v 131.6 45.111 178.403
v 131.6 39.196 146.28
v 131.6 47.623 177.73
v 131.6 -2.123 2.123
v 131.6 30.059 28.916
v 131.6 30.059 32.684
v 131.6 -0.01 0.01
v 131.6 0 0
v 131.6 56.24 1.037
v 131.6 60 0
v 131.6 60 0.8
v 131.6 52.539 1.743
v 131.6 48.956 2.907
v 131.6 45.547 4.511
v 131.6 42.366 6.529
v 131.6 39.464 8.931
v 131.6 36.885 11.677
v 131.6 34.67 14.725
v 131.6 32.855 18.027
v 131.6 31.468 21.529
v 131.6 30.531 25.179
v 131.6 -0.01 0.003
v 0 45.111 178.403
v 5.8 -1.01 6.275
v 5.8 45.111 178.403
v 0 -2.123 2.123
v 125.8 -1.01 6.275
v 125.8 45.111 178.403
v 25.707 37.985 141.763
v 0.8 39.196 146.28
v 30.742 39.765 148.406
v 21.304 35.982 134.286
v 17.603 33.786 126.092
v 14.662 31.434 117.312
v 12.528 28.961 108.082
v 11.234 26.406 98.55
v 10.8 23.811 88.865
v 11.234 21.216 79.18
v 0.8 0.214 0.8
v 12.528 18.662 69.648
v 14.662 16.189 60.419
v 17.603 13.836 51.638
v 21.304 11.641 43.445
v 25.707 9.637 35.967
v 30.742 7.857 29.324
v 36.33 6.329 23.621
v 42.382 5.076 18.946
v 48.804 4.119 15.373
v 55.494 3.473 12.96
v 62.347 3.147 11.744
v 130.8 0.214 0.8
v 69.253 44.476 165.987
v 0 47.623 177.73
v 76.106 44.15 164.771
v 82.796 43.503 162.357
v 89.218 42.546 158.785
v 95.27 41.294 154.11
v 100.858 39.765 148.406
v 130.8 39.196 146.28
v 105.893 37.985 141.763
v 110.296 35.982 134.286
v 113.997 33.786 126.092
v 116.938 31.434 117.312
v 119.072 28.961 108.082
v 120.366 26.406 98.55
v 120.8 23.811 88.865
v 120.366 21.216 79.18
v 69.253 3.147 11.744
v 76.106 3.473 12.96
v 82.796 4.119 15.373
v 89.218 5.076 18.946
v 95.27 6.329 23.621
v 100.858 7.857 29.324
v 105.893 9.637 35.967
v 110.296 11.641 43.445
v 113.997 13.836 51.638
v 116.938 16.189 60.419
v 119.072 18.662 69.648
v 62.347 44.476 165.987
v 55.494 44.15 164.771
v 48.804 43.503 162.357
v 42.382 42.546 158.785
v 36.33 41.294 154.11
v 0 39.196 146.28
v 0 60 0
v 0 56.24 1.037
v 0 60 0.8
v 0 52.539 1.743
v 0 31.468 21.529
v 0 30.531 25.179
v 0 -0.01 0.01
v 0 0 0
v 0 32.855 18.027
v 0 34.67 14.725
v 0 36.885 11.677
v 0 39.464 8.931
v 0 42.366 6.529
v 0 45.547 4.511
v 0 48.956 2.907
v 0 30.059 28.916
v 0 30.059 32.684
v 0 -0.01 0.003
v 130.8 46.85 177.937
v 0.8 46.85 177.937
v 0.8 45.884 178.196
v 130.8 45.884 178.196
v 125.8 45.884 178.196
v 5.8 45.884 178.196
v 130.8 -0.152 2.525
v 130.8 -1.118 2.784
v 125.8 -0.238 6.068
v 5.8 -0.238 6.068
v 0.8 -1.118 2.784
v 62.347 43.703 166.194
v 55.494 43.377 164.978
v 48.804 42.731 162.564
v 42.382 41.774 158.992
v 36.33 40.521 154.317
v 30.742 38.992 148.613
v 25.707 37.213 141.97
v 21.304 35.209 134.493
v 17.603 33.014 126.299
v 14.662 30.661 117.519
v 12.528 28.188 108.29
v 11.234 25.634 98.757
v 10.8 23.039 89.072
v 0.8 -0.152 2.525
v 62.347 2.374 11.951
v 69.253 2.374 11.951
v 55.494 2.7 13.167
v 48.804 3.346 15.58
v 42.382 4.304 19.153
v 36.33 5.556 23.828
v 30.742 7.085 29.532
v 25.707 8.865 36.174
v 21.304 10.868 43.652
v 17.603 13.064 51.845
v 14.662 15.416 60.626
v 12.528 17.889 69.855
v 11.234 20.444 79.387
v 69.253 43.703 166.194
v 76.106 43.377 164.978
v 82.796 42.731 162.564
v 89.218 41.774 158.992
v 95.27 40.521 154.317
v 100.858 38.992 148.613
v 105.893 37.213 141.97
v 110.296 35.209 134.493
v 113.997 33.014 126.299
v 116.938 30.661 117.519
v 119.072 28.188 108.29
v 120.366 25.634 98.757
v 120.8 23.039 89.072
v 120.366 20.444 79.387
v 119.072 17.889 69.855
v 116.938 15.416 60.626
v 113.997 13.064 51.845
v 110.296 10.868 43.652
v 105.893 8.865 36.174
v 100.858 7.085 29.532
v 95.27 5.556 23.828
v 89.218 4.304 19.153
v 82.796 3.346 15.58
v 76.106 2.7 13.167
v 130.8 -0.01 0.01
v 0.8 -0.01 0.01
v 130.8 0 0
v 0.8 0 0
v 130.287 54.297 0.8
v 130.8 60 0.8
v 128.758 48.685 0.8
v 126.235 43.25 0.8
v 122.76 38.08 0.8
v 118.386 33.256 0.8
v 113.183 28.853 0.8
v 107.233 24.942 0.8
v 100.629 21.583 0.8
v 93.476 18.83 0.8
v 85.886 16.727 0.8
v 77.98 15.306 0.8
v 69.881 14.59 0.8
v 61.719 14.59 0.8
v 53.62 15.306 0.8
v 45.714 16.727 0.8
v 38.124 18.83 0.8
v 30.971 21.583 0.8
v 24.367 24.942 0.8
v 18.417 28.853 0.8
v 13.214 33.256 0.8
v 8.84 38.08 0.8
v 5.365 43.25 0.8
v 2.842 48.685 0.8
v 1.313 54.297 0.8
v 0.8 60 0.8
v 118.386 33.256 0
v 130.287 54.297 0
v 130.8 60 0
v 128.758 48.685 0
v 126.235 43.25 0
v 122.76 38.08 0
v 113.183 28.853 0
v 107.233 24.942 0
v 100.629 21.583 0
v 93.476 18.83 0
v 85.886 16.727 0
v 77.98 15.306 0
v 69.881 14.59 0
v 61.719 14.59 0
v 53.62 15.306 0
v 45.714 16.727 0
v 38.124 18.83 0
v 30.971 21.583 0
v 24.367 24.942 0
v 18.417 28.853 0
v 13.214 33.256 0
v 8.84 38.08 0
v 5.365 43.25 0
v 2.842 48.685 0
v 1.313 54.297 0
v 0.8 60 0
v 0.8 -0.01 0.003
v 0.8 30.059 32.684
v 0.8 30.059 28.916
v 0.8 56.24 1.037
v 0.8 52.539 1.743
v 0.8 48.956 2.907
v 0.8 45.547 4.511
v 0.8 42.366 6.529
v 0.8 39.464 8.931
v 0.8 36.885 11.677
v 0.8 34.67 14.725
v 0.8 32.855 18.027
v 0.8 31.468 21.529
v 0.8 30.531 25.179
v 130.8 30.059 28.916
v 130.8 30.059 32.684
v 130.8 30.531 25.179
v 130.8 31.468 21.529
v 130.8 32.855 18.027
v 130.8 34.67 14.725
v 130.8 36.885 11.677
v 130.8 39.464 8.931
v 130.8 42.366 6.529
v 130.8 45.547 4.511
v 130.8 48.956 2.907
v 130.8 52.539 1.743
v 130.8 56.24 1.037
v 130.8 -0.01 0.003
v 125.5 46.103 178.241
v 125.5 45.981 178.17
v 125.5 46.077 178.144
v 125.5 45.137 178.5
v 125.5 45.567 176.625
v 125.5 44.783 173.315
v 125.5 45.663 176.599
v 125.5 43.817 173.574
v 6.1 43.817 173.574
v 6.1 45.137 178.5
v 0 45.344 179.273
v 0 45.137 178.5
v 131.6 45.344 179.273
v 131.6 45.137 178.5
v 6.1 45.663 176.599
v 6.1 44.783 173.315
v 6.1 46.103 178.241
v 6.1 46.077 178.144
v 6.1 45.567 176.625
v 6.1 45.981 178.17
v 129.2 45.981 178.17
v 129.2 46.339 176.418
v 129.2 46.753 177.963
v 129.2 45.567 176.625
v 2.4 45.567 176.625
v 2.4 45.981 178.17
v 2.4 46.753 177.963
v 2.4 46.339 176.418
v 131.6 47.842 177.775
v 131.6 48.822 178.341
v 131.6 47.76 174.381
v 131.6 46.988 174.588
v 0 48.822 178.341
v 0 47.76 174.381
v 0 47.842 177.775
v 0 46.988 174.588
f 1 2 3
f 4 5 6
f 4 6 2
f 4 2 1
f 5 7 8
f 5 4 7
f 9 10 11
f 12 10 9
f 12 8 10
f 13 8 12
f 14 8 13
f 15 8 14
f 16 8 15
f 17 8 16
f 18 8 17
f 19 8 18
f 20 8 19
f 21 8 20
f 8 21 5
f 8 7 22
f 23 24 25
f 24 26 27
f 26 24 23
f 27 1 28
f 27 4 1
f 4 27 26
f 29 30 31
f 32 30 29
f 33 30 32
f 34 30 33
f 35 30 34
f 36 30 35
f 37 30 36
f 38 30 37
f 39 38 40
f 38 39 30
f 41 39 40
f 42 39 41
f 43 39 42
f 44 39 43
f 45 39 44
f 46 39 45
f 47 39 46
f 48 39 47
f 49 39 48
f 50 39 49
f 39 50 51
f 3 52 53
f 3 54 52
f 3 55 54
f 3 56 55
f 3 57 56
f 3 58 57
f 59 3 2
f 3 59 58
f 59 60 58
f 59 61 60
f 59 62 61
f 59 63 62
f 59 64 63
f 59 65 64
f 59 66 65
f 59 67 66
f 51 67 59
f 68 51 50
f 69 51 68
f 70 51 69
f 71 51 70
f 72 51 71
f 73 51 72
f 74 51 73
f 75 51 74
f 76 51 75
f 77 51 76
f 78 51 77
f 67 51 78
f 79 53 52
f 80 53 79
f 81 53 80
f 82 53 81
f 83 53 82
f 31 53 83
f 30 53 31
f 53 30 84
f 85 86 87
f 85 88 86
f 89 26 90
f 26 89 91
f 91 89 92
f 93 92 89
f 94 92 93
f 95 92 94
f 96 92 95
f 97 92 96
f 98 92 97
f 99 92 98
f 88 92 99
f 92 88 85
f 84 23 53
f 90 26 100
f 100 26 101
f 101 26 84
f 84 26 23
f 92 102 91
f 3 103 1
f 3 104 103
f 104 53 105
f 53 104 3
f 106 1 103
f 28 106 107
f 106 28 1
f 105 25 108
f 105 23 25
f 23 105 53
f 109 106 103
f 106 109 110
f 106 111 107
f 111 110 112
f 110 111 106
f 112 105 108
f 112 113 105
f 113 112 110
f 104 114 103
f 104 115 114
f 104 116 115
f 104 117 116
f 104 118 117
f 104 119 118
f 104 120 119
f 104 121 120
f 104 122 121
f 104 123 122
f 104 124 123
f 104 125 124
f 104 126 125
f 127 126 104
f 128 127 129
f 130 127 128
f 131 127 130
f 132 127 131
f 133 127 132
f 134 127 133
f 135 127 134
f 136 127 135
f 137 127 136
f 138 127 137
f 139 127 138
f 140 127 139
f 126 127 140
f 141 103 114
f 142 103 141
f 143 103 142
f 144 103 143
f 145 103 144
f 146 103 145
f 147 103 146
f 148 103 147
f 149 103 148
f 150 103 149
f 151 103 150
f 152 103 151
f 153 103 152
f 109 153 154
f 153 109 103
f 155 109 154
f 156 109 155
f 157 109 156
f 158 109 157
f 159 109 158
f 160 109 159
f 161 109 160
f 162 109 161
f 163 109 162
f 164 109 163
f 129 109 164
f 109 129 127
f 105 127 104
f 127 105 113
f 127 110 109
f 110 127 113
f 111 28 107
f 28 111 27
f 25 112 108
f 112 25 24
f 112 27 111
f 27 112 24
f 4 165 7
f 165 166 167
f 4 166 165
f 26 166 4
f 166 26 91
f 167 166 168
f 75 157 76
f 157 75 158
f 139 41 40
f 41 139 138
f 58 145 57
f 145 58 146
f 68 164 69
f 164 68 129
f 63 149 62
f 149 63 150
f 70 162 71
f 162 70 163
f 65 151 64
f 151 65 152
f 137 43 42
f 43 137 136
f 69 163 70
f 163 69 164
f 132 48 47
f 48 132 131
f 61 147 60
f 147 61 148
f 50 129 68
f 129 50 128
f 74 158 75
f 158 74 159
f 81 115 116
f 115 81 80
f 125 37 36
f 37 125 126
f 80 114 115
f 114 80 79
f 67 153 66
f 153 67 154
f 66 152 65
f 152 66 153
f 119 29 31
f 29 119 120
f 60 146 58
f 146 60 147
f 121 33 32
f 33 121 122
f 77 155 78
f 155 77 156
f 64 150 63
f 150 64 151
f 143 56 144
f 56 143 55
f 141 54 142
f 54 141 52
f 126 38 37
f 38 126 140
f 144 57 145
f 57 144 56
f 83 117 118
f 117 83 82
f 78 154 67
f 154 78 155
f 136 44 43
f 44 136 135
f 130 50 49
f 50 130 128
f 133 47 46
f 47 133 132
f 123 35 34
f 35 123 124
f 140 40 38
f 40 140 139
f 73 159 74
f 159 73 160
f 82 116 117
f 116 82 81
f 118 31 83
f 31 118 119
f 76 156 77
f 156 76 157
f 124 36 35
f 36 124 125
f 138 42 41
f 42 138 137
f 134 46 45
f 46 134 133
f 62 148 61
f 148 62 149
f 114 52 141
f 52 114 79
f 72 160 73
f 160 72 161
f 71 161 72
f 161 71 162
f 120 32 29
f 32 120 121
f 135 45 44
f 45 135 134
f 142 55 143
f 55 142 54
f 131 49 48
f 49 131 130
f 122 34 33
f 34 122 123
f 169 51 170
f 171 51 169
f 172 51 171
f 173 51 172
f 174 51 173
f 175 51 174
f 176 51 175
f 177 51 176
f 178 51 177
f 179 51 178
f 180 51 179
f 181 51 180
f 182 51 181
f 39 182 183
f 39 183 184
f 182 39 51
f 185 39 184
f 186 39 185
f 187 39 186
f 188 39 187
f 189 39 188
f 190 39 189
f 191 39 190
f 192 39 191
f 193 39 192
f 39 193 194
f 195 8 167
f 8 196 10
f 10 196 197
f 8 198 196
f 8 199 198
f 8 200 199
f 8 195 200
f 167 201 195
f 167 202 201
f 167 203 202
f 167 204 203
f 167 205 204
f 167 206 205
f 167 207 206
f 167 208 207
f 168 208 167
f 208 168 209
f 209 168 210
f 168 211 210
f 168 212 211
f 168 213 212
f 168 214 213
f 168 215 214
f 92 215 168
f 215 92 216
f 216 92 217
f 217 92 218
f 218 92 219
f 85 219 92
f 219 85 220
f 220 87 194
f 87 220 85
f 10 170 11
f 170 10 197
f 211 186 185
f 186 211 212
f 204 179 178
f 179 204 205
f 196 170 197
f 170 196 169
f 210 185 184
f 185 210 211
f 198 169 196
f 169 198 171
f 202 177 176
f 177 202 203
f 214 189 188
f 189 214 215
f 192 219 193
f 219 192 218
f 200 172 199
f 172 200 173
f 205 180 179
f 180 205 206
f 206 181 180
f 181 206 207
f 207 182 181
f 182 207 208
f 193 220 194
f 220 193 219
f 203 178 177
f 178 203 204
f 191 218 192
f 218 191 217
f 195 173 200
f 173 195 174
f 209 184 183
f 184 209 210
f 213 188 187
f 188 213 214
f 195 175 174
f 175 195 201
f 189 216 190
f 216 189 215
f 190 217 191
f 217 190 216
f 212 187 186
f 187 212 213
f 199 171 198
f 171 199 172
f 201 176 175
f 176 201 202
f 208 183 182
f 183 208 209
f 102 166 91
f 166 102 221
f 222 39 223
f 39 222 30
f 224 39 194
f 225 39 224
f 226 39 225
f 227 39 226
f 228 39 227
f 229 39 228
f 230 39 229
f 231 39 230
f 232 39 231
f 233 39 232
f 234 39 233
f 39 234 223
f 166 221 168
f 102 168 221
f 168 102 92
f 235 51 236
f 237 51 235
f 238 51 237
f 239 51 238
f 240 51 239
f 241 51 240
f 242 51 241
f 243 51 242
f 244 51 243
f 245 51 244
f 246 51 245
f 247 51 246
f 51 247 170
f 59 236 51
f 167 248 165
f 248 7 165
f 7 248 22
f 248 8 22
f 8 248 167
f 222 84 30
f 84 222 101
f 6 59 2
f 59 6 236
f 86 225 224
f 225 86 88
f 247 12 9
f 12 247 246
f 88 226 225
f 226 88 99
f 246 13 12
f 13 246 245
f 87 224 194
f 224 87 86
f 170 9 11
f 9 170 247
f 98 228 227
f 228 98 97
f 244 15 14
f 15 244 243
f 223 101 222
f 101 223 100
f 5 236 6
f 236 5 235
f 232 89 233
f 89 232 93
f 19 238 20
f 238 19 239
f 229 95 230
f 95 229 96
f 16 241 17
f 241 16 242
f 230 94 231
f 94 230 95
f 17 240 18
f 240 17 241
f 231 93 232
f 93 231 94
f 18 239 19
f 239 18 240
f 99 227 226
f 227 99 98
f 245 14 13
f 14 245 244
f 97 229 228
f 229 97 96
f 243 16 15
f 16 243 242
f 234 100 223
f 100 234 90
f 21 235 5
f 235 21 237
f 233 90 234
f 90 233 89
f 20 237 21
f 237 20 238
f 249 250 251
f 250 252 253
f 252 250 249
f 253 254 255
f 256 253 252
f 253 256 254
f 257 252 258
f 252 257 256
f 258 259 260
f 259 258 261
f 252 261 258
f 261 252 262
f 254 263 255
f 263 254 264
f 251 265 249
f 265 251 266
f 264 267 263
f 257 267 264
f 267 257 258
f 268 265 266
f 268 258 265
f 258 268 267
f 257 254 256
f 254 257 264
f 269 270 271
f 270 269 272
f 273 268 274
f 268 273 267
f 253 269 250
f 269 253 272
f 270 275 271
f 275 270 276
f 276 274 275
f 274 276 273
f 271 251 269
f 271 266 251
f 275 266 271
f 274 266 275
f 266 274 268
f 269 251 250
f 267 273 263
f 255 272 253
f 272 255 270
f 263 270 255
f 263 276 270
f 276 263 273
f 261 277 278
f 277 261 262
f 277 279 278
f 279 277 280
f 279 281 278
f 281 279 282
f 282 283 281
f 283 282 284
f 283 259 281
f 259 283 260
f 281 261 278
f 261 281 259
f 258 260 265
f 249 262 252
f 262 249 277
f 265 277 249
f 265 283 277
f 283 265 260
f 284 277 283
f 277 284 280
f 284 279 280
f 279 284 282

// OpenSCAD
// -----------------------------------------------------
// Bilderrahmen V2
//
//  Detlev Ahlgrimm, 11.2018
// -----------------------------------------------------

// what to render
part=0;   // [0:assembled, 1:print, 2:frame only, 3:top edge only]

// width of photo
wp=130;   // [70:250]

// height of photo
hp=180;   // [70:250]

// thickness of photo
tp=1;     // [0.5:0.1:3]

// wall thickness
wt=0.8;   // [0.5:0.05:3]

// border thickness
bt=5;     // [1:0.1:10]

// support for opening
iso=0;    // [0:no support, 1:support]

// radius for support
sr=18;    // [10:0.5:30]

// shift for support
ss=0;     // [0:50]


/* [Hidden] */
$fn=50;
inner=[wp, hp, tp];

// -----------------------------------------------------
//    v : Abmessungs-Vektor
//    r : Radius der Aussparungen
//    w : Wandstaerke zwischen den Aussparungen
//    i : invertieren (true:Sechseck-Umrandungen, false:Sechsecke)
//    a : anschraegen 45 Grad (bei true)
// -----------------------------------------------------
module HexPatternV2(v, r=10, w=1, i=true, a=false) {
  dx=r*1.5;
  dy=r*0.866025;      // 0.866025=sqrt(3)/2
  sy=(i) ? -0.1 : 0;
  az=(i) ? 0.2 : 0;
  r1=(a) ? r-w/2-(v.z+0.2) : r-w/2;

  intersection() {
    difference() {
      if(i) cube(v);
      for(yi=[0:1:v.y/dy+1]) {
        for(xi=[0:1:v.x/(2*dx)+1]) {
          if((yi%2)==1) {
            translate([xi*2*dx+dx, yi*dy, sy]) cylinder(r1=r1, r2=r-w/2, h=v.z+az, $fn=6);
          } else {
            translate([xi*2*dx, yi*dy, sy]) cylinder(r1=r1, r2=r-w/2, h=v.z+az, $fn=6);
          }
        }
      }
    }
    if(!i) cube(v);
  }
}

// -----------------------------------------------------
//
// -----------------------------------------------------
module Frame() {
  rotate([75, 0, 0]) 
  difference() {
    cube([inner.x+2*wt, inner.y+5*wt, inner.z+2*wt]);
    translate([wt, 3*wt, wt]) cube([inner.x, inner.y+3*wt, inner.z]);
    translate([wt+bt, wt+bt, wt+inner.z-0.01]) cube([inner.x-2*bt, inner.y+3*wt, 2*wt]);
    rotate([-75-45, 0, 0]) translate([-0.1, -2*(wt+inner.z), -(wt+inner.z)]) cube([inner.x+2*wt+0.2, 2*(wt+inner.z), wt+inner.z]);
    translate([(inner.x+2*wt)/2, (inner.y+5*wt)/2, -0.1]) scale([(inner.x-20)/2, (inner.y-20)/2, 1]) cylinder(r=1, h=wt+0.2);
  }

  difference() {
    cube([inner.x+2*wt, inner.y/3, wt]);
    translate([(inner.x+2*wt)/2, inner.y/3, -0.1]) scale([1, 0.7, 1]) cylinder(d=inner.x, h=wt+0.2);
  }
  if(iso==1) {
    rotate([75, 0, 0]) intersection() {
      translate([-ss, inner.y+5*wt, 0]) rotate([0, 0, -90]) HexPatternV2([inner.y+5*wt, (inner.x+2*wt)+50, wt-0.01], sr, 4);
      cube([inner.x+2*wt, inner.y+5*wt, inner.z+2*wt]);
    }
  }
  cube([inner.x+2*wt, 1, wt]);

  difference() {
    for(x=[0, inner.x+wt])
      translate([x, 0, 0]) hull() {
        cube([wt, inner.y/3, wt]);
        rotate([75, 0, 0]) cube([wt, inner.y, 0.01]);
      }
    hull() {
      translate([-0.1, inner.y/3, inner.y/6+wt]) rotate([0, 90, 0]) cylinder(r=inner.y/6, h=inner.x+4*wt+0.2);
      translate([-0.1, inner.y/3+inner.y/15, inner.y]) rotate([0, 90, 0]) cylinder(r=inner.y/6, h=inner.x+4*wt+0.2);
    }
  }
}

// -----------------------------------------------------
//
// -----------------------------------------------------
module TopEdge() {
  translate([wt+bt+0.3, 5*wt+inner.y-bt, wt+inner.z-0.2]) cube([inner.x-2*bt-0.6, bt+wt, wt+0.2]);
  translate([3*wt, 3*wt+inner.y, wt+0.1]) cube([inner.x-4*wt, 2*wt, inner.z-0.2]);
  translate([0, inner.y+5*wt+0.1, -wt-0.2]) cube([inner.x+2*wt, wt, inner.z+3*wt+0.2]);
  translate([0, inner.y+wt, -wt-0.2]) cube([inner.x+2*wt, 4*wt+0.2, wt]);
}

if(part==0) {
  Frame();
  rotate([75, 0, 0]) TopEdge();
} else if(part==1) {
  Frame();
  translate([0, -10*wt, 0]) rotate([-90, 0, 0]) translate([0, -(6*wt+inner.y+0.1), wt+0.2]) TopEdge();
} else if(part==2) {
  Frame();
} else if(part==3) {
  translate([0, -10*wt, 0]) rotate([-90, 0, 0]) translate([0, -(5*wt+inner.y+0.1), wt+0.2]) TopEdge();
}
